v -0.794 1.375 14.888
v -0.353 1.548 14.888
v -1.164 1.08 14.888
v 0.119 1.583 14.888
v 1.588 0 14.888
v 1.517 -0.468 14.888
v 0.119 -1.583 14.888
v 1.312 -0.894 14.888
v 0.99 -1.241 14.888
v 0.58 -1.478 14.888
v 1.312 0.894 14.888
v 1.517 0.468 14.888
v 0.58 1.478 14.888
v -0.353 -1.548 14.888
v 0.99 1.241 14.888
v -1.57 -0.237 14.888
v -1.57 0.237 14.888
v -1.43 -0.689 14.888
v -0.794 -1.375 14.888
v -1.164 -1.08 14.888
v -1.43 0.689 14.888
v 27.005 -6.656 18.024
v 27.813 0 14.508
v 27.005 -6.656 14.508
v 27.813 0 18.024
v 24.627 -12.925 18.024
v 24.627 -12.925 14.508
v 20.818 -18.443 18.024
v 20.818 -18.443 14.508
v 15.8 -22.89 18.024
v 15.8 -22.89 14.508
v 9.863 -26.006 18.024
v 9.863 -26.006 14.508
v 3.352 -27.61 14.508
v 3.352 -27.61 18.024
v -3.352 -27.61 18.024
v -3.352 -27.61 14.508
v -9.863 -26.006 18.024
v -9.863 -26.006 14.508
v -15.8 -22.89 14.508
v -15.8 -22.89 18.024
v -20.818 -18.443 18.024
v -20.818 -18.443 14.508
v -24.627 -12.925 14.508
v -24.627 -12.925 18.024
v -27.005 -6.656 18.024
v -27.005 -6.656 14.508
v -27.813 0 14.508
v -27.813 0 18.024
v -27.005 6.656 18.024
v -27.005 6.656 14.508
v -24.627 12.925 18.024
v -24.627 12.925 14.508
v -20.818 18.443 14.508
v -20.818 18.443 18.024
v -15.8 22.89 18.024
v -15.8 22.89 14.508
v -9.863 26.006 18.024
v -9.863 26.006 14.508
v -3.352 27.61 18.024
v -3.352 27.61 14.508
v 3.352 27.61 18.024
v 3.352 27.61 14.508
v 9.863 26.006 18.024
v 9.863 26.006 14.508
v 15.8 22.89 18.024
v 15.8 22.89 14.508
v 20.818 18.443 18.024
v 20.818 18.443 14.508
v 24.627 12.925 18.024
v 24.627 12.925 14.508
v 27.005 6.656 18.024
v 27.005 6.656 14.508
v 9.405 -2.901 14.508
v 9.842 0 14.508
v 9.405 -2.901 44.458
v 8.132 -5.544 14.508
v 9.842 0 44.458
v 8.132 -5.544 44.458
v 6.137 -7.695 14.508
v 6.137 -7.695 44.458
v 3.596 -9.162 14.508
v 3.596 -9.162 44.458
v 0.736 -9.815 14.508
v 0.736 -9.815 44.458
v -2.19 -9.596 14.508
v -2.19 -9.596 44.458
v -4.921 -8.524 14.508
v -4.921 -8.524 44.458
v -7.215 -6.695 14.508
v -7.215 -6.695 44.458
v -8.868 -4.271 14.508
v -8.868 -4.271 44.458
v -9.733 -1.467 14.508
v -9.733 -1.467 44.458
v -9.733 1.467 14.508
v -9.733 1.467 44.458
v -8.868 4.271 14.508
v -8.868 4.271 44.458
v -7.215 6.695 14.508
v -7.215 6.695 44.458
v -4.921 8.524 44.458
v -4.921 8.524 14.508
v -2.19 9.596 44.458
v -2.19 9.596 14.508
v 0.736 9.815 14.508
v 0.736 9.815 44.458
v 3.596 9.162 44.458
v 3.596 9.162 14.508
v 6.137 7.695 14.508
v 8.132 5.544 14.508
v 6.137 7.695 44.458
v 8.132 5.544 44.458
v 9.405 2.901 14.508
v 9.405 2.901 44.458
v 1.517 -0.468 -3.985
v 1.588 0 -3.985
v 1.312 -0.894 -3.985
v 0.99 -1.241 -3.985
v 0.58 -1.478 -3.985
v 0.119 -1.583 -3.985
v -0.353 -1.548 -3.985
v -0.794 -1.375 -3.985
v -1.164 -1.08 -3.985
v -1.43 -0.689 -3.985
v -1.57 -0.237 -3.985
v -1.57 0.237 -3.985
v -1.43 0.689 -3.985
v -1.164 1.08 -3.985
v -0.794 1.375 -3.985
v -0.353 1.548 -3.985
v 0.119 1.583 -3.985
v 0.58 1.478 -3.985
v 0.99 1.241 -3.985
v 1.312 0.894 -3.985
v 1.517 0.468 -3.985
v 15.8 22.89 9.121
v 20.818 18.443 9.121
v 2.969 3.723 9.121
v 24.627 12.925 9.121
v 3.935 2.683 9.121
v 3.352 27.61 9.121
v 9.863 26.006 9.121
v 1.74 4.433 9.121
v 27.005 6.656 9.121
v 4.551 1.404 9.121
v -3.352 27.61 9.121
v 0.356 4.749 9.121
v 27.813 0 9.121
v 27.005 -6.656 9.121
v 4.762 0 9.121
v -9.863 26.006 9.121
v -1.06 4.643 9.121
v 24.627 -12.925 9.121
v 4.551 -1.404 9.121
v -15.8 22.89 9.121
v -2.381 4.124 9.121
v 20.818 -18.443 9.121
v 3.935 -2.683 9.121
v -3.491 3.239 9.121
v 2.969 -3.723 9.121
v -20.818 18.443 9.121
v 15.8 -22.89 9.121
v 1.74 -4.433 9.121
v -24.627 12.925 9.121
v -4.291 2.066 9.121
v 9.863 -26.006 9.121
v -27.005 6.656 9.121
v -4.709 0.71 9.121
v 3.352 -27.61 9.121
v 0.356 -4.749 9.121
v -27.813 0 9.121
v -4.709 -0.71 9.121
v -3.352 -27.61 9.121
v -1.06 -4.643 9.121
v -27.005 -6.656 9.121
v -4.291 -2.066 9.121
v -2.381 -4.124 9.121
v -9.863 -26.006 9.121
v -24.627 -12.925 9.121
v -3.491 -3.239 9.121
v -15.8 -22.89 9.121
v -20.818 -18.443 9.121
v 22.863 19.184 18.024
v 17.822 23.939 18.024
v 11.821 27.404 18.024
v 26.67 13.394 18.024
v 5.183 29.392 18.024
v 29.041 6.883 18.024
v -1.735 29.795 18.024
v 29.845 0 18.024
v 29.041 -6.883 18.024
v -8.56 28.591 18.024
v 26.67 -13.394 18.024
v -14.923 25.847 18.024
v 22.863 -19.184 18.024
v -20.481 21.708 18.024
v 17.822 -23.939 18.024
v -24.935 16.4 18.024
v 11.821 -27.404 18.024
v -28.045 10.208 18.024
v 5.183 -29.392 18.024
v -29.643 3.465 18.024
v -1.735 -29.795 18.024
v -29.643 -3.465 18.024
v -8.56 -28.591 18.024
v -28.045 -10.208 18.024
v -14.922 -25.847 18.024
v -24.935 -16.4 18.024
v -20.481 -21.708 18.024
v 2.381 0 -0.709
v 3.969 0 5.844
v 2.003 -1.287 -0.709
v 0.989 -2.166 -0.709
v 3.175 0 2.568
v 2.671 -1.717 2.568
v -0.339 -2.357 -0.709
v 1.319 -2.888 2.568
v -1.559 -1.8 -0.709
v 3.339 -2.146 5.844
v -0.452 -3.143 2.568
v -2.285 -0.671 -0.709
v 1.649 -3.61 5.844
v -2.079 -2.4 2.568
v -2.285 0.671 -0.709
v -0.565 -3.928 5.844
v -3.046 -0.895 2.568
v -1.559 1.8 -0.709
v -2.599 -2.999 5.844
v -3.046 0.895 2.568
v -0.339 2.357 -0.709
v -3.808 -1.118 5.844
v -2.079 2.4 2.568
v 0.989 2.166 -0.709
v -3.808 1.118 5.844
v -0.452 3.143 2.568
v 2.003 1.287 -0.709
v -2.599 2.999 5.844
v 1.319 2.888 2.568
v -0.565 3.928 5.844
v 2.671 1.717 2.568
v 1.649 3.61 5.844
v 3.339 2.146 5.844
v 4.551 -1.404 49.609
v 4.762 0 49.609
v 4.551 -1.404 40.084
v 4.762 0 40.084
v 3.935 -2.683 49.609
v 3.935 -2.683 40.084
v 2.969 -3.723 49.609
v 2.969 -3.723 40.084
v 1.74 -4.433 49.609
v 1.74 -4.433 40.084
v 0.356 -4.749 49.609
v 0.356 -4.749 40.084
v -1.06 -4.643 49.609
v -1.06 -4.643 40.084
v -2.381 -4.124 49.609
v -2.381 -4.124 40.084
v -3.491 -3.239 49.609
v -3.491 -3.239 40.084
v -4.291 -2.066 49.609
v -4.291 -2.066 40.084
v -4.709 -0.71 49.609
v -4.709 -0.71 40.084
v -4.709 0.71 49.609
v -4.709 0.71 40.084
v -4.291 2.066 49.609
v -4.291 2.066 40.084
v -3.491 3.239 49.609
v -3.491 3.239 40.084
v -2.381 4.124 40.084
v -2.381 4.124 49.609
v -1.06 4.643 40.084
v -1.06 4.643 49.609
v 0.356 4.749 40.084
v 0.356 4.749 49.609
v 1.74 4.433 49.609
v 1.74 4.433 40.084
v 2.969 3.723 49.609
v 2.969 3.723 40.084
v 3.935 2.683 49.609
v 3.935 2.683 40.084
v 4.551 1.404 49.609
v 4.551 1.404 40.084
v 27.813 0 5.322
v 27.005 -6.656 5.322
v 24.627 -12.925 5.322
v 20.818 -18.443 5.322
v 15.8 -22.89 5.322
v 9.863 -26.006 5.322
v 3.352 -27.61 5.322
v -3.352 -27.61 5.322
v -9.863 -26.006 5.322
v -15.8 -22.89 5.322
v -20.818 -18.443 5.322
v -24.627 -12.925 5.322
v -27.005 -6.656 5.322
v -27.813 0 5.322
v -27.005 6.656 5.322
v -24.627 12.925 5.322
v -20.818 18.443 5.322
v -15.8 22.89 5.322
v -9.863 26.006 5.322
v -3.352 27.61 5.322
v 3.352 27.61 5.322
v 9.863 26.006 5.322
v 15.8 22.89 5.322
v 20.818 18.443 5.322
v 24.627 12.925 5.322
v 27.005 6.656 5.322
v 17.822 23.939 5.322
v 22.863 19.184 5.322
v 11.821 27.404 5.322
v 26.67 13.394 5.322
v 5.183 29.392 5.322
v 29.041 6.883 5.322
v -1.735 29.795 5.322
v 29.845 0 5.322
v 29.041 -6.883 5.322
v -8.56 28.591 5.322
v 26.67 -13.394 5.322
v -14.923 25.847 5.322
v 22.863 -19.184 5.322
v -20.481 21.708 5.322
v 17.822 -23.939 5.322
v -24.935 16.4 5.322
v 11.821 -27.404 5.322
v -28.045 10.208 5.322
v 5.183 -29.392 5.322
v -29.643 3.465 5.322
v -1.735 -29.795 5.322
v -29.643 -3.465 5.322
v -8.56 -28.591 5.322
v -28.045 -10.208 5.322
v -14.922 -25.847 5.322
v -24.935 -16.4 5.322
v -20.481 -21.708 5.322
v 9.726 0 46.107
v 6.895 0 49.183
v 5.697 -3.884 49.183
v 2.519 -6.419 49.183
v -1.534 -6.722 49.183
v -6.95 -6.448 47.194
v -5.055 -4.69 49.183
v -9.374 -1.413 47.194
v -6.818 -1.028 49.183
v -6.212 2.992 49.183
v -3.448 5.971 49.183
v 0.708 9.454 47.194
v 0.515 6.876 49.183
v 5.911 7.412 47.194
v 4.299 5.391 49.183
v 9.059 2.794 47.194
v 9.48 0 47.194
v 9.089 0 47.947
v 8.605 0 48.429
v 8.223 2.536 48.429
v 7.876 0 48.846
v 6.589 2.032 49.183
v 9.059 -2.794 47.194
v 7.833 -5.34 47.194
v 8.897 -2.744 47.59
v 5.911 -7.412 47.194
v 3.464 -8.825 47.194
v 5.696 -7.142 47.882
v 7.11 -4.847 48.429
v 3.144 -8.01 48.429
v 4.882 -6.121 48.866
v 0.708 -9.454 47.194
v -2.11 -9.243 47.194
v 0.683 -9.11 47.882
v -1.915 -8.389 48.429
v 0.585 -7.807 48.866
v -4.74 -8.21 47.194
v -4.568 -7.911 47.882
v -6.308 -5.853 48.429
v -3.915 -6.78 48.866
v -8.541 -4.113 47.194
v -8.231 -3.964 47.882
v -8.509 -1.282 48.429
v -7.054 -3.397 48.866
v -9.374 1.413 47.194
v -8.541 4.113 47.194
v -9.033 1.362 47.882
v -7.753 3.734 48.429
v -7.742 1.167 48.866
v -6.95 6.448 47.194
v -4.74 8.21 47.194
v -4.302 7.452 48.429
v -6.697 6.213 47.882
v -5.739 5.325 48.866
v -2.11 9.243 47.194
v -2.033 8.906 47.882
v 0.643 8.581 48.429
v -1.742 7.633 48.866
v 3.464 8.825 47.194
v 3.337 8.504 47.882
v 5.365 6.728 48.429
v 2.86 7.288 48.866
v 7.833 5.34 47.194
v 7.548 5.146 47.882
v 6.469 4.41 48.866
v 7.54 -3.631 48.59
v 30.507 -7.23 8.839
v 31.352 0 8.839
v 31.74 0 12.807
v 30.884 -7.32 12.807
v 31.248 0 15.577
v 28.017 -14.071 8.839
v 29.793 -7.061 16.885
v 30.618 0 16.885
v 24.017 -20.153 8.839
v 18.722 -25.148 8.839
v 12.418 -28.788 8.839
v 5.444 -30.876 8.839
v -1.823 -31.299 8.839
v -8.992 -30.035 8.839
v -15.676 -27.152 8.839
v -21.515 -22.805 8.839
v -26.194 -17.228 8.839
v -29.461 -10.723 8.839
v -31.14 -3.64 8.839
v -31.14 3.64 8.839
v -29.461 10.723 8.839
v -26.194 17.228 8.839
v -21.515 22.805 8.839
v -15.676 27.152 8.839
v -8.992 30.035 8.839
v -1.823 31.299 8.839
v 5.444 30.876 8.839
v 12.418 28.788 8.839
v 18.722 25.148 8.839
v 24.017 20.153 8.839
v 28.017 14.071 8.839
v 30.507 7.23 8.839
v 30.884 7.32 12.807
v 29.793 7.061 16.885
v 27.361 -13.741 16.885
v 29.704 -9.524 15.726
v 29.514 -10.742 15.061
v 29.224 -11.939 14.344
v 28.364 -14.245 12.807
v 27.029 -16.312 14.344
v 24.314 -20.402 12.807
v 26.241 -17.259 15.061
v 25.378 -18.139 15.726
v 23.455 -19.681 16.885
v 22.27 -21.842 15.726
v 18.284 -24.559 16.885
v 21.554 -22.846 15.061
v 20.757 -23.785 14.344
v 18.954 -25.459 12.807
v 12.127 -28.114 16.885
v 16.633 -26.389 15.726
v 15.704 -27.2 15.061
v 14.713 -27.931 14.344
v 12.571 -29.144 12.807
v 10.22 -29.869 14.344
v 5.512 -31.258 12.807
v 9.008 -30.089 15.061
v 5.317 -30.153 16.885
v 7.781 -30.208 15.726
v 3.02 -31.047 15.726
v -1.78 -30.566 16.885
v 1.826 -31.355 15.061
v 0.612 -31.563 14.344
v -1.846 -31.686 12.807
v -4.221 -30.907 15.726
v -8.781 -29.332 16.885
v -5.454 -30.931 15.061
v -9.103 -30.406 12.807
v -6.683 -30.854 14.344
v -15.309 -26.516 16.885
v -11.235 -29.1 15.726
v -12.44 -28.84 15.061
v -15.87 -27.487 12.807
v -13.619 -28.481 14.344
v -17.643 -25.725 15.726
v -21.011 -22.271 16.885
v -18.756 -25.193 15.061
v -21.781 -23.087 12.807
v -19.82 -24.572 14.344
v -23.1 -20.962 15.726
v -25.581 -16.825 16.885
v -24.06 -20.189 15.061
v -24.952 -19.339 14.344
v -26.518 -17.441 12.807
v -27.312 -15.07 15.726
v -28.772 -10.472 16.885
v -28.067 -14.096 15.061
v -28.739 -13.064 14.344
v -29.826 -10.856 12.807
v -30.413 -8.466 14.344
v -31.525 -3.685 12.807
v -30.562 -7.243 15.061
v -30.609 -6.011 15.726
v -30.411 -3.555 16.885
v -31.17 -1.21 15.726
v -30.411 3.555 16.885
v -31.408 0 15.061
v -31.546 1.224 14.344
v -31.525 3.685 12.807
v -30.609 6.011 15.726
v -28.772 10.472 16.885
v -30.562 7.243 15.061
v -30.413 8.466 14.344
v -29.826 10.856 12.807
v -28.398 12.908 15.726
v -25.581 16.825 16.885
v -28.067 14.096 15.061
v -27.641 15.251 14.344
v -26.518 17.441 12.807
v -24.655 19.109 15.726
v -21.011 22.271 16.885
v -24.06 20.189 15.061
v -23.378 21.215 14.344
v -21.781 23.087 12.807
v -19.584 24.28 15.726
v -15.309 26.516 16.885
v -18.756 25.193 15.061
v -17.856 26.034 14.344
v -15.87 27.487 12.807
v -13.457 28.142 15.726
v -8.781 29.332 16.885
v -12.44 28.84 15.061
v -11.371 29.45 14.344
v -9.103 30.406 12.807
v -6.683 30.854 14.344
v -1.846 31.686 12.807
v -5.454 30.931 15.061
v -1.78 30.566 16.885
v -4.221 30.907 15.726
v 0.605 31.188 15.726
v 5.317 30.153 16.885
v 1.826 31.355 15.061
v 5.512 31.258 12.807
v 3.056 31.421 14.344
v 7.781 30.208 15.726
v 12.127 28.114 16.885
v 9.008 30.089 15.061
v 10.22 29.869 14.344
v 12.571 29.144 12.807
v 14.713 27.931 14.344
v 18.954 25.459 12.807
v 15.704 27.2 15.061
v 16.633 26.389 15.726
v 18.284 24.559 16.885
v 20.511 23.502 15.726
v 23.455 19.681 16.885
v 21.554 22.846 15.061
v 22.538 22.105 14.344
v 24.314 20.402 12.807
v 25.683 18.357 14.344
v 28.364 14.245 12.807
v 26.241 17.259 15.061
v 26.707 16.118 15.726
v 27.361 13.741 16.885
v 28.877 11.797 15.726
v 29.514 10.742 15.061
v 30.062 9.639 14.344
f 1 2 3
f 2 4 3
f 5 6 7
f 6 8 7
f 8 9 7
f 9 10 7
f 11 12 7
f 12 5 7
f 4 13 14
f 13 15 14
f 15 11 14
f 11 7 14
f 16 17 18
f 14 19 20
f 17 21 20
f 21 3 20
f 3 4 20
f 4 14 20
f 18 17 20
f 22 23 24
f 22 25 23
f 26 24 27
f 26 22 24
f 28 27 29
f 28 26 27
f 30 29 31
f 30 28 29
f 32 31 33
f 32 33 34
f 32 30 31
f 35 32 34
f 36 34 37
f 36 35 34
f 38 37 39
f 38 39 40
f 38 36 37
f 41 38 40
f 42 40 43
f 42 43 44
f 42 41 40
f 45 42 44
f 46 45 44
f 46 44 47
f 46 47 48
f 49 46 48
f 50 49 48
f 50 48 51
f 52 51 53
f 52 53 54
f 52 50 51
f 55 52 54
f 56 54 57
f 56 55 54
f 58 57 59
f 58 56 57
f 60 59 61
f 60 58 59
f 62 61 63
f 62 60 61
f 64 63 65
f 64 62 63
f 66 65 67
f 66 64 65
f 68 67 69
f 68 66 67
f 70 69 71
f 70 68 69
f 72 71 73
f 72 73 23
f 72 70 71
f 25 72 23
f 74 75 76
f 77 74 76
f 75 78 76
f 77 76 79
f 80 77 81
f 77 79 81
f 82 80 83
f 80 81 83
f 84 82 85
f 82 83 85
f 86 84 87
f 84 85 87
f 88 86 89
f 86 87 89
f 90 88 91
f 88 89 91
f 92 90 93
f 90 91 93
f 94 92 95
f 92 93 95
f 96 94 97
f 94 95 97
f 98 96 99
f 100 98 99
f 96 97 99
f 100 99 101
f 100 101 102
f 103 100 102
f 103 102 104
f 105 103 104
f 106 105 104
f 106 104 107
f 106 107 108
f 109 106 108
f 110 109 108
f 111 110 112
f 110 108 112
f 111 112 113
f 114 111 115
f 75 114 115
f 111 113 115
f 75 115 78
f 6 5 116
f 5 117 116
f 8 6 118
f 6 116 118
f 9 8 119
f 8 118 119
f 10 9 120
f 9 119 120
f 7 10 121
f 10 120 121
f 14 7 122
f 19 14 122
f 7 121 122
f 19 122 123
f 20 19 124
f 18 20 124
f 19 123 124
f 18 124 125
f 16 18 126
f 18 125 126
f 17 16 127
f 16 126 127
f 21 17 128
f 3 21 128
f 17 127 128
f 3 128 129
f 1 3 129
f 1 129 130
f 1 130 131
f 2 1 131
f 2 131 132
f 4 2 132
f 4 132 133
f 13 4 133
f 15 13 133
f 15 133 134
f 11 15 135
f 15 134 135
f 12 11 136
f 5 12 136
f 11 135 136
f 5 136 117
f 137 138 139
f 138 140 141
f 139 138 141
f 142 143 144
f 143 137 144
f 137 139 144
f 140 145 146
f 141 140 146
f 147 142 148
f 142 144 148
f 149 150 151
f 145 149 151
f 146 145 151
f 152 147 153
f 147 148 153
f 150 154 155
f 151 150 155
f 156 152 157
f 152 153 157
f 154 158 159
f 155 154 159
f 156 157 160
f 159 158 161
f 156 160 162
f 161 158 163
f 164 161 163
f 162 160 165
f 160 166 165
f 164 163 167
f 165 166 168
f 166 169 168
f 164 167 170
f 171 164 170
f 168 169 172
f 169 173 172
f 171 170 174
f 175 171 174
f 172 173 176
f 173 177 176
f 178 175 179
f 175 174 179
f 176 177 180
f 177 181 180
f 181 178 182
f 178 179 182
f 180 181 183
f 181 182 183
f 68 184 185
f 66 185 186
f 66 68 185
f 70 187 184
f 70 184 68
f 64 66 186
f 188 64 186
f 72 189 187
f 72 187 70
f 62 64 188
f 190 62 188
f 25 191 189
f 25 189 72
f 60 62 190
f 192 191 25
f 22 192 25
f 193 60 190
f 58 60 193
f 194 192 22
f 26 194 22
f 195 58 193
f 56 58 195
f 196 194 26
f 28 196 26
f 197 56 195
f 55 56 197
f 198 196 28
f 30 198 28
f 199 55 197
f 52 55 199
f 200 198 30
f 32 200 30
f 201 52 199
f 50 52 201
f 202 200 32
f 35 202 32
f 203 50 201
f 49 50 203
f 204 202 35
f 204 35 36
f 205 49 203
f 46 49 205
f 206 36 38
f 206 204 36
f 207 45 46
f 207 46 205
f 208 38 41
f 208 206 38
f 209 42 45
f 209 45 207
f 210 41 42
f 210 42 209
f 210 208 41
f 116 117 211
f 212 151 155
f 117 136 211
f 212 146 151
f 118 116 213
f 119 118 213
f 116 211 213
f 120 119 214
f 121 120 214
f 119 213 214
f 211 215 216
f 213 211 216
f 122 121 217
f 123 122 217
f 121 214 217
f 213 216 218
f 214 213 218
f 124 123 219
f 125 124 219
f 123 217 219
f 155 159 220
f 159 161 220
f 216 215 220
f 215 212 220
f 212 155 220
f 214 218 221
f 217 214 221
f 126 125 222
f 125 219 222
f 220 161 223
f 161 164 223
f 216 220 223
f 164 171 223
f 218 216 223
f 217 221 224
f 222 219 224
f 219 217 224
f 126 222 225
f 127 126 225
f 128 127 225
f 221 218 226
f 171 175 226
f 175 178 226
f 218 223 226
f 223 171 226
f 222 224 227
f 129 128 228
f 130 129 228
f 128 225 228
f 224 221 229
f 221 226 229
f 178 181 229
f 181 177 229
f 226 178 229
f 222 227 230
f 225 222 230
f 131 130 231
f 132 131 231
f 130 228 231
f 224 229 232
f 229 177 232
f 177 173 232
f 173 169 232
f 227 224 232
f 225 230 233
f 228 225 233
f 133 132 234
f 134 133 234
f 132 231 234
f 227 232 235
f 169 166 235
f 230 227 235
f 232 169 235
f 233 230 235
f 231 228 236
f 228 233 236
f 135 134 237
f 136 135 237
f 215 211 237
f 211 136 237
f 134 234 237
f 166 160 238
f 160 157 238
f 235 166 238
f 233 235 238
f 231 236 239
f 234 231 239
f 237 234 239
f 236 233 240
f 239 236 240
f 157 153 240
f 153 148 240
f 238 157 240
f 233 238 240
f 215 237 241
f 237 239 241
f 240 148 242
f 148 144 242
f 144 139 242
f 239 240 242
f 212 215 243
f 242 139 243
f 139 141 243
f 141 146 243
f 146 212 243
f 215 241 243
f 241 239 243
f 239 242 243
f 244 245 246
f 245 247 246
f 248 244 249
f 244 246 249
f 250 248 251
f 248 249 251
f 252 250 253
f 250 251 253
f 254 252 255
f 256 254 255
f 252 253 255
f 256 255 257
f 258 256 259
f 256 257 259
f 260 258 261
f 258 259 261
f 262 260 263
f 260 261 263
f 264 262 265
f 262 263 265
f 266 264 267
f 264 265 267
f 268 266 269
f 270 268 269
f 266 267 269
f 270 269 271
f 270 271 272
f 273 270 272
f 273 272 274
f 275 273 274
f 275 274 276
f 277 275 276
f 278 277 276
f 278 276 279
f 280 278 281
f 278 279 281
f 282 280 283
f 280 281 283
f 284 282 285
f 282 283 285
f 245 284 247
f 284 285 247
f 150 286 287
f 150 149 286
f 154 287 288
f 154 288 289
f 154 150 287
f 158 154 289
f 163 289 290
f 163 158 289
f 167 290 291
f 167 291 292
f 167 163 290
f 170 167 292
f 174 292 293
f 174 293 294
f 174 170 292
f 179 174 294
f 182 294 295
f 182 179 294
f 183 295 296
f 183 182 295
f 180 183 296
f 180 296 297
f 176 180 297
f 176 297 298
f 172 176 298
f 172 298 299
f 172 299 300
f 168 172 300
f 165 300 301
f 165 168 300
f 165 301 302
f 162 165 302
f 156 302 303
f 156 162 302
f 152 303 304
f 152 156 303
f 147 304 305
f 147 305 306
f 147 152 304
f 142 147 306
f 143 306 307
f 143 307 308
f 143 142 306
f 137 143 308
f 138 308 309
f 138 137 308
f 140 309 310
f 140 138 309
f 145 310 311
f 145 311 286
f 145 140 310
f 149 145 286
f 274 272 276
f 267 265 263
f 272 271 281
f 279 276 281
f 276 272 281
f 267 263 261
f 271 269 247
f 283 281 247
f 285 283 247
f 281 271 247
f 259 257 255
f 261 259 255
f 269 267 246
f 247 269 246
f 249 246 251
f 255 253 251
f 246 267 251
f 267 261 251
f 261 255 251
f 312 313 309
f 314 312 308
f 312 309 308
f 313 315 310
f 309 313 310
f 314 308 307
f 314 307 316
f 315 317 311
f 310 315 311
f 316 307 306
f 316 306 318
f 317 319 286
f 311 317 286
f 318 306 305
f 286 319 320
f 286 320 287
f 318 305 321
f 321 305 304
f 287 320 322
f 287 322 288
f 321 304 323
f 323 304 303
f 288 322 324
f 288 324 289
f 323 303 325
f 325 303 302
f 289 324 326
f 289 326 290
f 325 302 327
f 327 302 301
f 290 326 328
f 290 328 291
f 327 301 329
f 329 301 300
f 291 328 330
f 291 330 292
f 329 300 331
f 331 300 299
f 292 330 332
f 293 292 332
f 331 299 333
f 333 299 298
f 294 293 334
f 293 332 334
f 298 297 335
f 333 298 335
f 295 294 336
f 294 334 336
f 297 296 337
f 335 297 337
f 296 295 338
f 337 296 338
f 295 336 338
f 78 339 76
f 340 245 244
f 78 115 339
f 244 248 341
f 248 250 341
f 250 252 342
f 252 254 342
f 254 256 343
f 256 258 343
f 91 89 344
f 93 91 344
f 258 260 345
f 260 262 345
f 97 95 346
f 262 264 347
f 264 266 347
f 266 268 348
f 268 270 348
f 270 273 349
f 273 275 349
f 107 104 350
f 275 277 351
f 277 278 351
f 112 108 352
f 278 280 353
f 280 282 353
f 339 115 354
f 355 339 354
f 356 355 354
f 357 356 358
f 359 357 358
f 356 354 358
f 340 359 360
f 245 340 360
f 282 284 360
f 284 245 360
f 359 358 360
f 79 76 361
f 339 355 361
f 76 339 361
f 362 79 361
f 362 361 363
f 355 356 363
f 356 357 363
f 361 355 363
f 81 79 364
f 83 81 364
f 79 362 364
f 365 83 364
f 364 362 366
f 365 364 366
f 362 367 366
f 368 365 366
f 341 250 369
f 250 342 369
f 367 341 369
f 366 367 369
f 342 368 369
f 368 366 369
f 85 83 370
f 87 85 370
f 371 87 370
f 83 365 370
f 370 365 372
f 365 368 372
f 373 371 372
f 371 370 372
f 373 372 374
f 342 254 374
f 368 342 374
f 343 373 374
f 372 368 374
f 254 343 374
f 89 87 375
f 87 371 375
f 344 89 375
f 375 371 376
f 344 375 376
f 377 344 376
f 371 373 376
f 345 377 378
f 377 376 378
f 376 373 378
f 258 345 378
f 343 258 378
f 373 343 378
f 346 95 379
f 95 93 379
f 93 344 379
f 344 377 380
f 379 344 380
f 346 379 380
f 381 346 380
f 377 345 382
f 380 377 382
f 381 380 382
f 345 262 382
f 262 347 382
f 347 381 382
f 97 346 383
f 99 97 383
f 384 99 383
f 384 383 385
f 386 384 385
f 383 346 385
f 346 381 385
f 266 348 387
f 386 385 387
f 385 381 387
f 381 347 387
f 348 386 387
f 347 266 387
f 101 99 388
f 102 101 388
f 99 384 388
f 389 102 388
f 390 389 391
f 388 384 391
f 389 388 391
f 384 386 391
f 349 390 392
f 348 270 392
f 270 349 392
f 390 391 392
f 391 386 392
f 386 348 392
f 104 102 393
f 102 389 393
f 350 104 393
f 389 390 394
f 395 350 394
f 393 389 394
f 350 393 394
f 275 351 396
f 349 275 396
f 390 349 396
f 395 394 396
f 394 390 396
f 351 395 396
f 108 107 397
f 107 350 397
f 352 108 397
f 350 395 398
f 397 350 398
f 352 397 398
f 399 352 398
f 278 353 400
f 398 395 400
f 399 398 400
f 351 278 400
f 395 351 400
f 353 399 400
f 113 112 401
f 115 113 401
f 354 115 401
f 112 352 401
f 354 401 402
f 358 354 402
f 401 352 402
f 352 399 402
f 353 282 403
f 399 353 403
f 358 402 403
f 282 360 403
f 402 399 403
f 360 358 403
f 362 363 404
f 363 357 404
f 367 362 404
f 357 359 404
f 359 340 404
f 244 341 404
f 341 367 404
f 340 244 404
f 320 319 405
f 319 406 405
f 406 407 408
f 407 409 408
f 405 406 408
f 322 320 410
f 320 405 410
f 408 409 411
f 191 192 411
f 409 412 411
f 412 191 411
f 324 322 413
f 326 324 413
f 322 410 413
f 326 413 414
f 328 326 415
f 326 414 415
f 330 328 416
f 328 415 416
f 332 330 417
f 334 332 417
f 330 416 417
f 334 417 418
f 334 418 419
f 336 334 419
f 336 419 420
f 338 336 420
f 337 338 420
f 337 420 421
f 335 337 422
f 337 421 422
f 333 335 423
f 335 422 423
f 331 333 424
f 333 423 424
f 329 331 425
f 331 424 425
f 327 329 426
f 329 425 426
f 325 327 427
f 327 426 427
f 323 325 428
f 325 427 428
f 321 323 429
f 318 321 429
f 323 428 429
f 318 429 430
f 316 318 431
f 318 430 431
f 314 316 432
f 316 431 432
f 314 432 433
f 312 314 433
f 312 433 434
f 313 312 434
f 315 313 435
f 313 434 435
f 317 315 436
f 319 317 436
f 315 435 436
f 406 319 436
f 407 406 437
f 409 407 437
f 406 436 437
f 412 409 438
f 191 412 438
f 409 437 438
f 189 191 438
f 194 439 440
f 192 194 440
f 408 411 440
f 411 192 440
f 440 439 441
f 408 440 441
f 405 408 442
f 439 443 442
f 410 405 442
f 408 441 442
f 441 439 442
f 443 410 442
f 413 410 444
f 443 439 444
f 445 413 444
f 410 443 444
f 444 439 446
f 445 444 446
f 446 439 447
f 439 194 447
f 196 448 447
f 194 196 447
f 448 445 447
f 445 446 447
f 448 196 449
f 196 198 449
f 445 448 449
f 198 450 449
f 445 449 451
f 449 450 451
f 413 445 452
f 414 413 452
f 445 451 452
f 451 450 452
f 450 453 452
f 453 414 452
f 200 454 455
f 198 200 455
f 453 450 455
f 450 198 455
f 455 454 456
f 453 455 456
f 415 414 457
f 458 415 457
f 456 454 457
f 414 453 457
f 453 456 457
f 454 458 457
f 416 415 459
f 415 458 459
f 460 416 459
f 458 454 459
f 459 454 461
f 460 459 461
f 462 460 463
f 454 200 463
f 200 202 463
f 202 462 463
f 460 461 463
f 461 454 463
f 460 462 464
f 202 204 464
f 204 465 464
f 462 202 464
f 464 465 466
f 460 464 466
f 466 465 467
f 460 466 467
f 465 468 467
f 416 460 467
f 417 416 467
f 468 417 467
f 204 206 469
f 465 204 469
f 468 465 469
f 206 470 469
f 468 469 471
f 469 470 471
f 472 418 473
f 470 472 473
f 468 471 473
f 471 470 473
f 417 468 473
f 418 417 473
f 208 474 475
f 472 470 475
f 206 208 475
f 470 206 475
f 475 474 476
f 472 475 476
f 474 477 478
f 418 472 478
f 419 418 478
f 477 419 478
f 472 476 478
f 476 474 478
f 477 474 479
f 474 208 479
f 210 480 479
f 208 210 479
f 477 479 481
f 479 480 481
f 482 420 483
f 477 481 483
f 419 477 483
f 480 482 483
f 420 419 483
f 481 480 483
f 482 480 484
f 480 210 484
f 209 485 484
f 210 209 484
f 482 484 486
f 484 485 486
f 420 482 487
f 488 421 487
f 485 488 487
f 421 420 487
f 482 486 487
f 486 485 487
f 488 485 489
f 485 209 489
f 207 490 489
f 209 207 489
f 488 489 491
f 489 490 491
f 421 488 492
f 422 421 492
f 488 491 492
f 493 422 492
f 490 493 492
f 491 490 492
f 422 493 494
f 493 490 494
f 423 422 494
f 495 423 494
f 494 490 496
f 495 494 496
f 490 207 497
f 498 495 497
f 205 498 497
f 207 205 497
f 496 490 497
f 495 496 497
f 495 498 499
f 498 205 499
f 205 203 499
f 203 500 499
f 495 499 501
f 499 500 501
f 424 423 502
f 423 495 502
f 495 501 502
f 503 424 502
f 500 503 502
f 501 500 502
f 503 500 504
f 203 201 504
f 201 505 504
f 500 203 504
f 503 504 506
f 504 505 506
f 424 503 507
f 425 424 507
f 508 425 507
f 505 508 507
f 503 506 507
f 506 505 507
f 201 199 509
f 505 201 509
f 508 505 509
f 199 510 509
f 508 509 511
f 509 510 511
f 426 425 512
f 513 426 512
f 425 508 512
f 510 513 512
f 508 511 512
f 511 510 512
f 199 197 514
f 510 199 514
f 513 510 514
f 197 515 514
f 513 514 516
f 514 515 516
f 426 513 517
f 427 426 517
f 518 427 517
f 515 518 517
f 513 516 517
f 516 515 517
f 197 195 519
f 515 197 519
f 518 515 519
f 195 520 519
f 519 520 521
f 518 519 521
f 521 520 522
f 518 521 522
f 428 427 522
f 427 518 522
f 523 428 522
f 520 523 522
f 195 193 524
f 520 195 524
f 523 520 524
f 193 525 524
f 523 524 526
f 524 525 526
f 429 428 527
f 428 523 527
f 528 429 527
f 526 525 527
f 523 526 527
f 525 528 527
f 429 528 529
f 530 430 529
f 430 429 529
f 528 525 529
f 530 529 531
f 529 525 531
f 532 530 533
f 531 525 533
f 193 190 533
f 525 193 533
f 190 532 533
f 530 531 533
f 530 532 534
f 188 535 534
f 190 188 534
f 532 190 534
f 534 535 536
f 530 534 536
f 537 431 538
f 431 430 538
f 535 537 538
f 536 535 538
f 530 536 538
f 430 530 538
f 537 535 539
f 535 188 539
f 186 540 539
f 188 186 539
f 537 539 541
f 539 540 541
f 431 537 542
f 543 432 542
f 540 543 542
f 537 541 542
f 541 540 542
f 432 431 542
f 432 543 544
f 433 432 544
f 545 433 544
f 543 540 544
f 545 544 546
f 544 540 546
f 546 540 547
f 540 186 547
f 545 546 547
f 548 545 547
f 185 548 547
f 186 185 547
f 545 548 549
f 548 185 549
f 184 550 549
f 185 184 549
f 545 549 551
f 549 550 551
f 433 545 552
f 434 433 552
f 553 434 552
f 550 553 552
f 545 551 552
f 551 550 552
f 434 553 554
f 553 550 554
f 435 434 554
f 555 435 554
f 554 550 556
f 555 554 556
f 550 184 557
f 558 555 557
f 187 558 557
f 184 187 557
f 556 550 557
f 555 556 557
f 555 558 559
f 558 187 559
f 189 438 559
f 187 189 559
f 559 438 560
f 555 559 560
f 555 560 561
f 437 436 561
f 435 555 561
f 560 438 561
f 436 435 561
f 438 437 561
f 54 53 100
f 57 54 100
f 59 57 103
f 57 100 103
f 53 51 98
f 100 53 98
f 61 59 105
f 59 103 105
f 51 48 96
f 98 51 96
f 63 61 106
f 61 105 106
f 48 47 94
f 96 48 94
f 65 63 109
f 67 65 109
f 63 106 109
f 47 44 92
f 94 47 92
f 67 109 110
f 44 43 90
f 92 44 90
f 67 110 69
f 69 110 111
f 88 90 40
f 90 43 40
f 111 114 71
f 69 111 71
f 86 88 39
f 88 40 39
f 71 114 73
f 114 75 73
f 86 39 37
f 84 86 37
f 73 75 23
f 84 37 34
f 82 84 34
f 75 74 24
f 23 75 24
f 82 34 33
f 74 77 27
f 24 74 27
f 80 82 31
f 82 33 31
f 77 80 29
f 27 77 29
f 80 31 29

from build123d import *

# Parameters (mm, degrees)
F0_W   = 2.032
F0_H   = 3.5161375999
F0_H_2 = 3.7984182127


with BuildPart() as f1:
    # F0 (on Front) → F1 (revolve)
    with BuildSketch(Plane.XZ):
        with BuildLine():
            add(Edge.make_bspline(
                [(9.8425, 44.4575436413), (9.7839845115, 45.8562221224), (9.6608982492, 48.7740941859), (6.4413978333, 49.328065318), (4.7625, 49.6088718547)],
                knots=[0, 0, 0, 0, 0.4787127794, 1, 1, 1, 1], degree=3))
            Line((4.7625, 49.6088718547), (4.7625, 40.0838718547))
            Line((4.7625, 40.0838718547), (4.7625, 14.5083051175))
            Line((4.7625, 14.5083051175), (9.8425, 14.5083051175))
            Line((9.8425, 14.5083051175), (9.8425, 44.4575436413))
        make_face()
        Polygon((4.7625, 14.5083051175), (4.7625, 40.0838718547), (0, 40.0838718547), (0, 14.8882698268), (1.5875, 14.8882698268), (1.5875, -3.9851281453), (4.7625, 9.1208834201), (27.813, 9.1208834201), (27.813, 14.5083051175), (9.8425, 14.5083051175), align=None)
        with Locations((28.829, 16.2663739175)):
            Rectangle(F0_W, F0_H)
        Polygon((29.845, 14.5083051175), (27.813, 14.5083051175), (27.813, 9.1208834201), (29.845, 9.1208834201), (29.845, 11.8057662621), align=None)
        with BuildLine():
            Line((29.845, 18.0244427174), (29.845, 14.5083051175))
            Line((29.845, 14.5083051175), (29.845, 11.8057662621))
            Line((29.845, 11.8057662621), (29.845, 9.1208834201))
            Line((29.845, 9.1208834201), (29.845, 5.3224652074))
            add(Edge.make_bspline(
                [(29.845, 5.3224652074), (30.3025890093, 6.1582561658), (31.2861081088, 7.9546637588), (31.9451527508, 11.7786724446), (31.4898737031, 15.7306460213), (30.3597593214, 17.3066044855), (29.845, 18.0244427174)],
                knots=[0, 0, 0, 0, 0.2344851114, 0.5039906574, 0.7740711589, 1, 1, 1, 1], degree=3))
        make_face()
        with Locations((28.829, 7.2216743138)):
            Rectangle(F0_W, F0_H_2)
    revolve(axis=Axis((0, 0, 27.4860708408), (0, 0, -1)))


solid = f1.part
